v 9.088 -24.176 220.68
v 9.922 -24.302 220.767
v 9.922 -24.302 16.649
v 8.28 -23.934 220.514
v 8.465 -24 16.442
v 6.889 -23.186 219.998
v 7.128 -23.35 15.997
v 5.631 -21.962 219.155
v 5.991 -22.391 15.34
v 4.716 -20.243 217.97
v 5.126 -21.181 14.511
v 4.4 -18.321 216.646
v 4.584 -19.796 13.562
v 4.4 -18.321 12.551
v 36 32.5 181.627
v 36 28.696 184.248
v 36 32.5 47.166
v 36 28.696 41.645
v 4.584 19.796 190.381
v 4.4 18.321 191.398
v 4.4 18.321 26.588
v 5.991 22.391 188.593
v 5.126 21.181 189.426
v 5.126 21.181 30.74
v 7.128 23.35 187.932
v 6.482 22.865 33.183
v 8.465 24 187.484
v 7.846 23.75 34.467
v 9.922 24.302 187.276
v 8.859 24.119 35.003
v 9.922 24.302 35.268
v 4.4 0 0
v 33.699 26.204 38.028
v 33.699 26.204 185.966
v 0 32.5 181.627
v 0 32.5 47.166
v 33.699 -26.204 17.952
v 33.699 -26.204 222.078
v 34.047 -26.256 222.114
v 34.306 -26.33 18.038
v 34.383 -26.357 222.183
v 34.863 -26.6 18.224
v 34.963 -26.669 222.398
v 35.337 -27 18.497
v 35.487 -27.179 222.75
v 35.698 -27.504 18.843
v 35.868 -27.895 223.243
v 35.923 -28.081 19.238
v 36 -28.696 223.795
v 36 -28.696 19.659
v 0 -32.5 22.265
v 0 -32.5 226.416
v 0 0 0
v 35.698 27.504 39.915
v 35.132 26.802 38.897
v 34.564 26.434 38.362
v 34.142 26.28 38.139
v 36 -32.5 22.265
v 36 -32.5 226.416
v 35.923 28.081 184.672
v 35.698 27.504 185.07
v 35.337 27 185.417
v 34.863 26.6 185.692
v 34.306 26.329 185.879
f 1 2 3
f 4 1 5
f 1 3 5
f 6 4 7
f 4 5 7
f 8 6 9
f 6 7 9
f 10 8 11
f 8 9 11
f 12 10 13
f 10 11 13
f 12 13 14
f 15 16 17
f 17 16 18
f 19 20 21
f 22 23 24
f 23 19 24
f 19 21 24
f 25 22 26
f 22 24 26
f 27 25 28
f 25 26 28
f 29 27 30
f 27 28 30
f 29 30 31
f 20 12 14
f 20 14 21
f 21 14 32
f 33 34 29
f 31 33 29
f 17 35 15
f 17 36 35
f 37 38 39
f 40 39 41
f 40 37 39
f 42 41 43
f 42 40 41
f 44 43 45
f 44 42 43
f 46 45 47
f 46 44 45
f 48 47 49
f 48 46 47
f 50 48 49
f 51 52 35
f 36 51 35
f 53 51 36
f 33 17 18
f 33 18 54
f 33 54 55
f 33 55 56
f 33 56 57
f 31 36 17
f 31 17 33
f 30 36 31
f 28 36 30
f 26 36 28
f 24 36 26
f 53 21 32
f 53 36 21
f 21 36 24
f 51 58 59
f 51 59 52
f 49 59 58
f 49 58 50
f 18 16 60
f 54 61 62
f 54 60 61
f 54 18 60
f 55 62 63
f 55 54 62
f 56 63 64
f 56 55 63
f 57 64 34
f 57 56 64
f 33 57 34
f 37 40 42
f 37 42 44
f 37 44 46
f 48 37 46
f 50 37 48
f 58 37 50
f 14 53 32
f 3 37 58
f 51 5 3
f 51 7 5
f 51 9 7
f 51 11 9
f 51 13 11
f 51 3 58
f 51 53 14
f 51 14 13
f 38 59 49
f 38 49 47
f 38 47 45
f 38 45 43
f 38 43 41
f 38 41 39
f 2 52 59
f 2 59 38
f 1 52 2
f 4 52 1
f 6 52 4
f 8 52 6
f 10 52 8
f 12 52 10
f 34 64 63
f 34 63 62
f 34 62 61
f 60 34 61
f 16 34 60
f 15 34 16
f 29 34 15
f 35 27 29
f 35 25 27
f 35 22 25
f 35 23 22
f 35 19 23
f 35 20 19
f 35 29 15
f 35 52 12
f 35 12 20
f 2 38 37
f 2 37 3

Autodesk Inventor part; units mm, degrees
ref_plane "Начальная плоскость" through (0, 0, 0) normal (0, 0, 1) x (1, 0, 0)
ref_plane "Конечная плоскость" through (0, 0, 226.4162) normal (0, 0, 1) x (1, 0, 0)
sketch "Эскиз" plane through (0, 0, 0) normal (0, 0, 1) x (1, 0, 0)
  line L0 (36, -32.5) -> (0, -32.5)
  line L1 (36, -32.5) -> (36, -28.696)
  line L2 (33.6994, -26.2039) -> (9.9215, -24.3017)
  line L3 (4.4, -18.3208) -> (4.4, 18.3208)
  line L4 (33.6994, 26.2039) -> (9.9215, 24.3017)
  line L5 (36, 28.696) -> (36, 32.5)
  line L6 (0, 32.5) -> (36, 32.5)
  line L7 (0, -32.5) -> (0, 32.5)
  arc A0 (4.4, -18.3208) -> (9.9215, -24.3017) centre (10.4, -18.3208) ccw
  arc A1 (9.9215, 24.3017) -> (4.4, 18.3208) centre (10.4, 18.3208) ccw
  arc A2 (36, -28.696) -> (33.6994, -26.2039) centre (33.5, -28.696) ccw
  arc A3 (33.6994, 26.2039) -> (36, 28.696) centre (33.5, 28.696) ccw
  line L8 (0, 45.5) -> (0, -45.5) construction
  line L9 (-7.2974, 0) -> (43.7847, 0) construction
  point P0 (36, -26.388)
  point P1 (4.4, -23.86)
  point P2 (4.4, 23.86)
  point P3 (36, 26.388)
  dimension "d3" = 36
  dimension "d5" = 4.4
  dimension "d7" = 65
  dimension "d9" = 8.64
  dimension "d11" = 8.64
  dimension "d13" = 6.112
  dimension "d15" = 6.112
  dimension "d22" = 6
  dimension "d23" = 2.5
  dimension "d24" = 32.5
  dimension "d25" = 0
extrude "Тело" add sketch "Эскиз" along normal up to surface (226.4162 mm away) from surface at 0
sketch "Sketch3" plane through (0, 0, 0) normal (0, 0, 1) x (1, 0, 0)
  line L0 (0, 0) -> (10, 0)
ref_plane "Work Plane7" through (0, 0, 0) normal (0, -1, 0) x (1, 0, 0)
sketch "Sketch4" plane through (0, 0, 0) normal (0, -1, 0) x (1, 0, 0)
  line L0 (-2, 0) -> (12, 0)
  line L1 (-2, 226.4162) -> (12, 226.4162)
  dimension "d29" = 226.4162
ref_plane "РабПлоскость8" through (-29, -423.958, 290.4468) normal (0, -0.5651746, -0.8249713) x (1, 0, 0)
split "Разделение1" plane through (-29, -423.958, 290.4468) removes the side toward (0, -0.5651746, -0.8249713)
ref_plane "РабПлоскость9" through (36, -560.5141, 590.2499) normal (0, 0.5674011, 0.8234416) x (1, 0, 0)
split "Разделение2" plane through (36, -560.5141, 590.2499) removes the side toward (0, 0.5674011, 0.8234416)
ref_plane "РабПлоскость10" through (36, 95.3234, 138.3382) normal (0, 0.8234416, -0.5674011) x (1, 0, 0)
split "Разделение3" plane through (36, 95.3234, 138.3382) removes the side toward (0, 0.8234416, -0.5674011)
equation "\"d3\" = b"
equation "\"d5\" = t1"
equation "\"d7\" = ParH"
equation "\"d9\" = msp_x1 + t2"
equation "\"d11\" = msp_x1 + t2"
equation "\"d13\" = -msp_x2 + t2"
equation "\"d15\" = -msp_x2 + t2"
equation "\"d22\" = R"
equation "\"d23\" = R1"
equation "\"d24\" = 0.5 * d7"
equation "\"d16\" = G_L"
equation "\"R1\" = 2.5"
equation "\"R\" = 6"
equation "\"t1\" = 4.4"
equation "\"t2\" = 7.2"
equation "\"ParH\" = 65"
equation "\"b\" = 36"
equation "\"msp_x1\" = 0.04 * b"
equation "\"msp_x2\" = -0.08 * t1 + 0.04 * b"
equation "\"G_L\" = d29"
equation "\"ex\" = 0"
equation "\"G_OFFSET_START\" = 0"
equation "\"G_OFFSET_END\" = 22.18382"
equation "\"d27\" = G_OFFSET_END + B_L"
equation "\"B_L\" = 204.2324"
properties part number "Швеллер 6.5U-226,42 ГОСТ 8240-97" material "Сталь, мягкая"
